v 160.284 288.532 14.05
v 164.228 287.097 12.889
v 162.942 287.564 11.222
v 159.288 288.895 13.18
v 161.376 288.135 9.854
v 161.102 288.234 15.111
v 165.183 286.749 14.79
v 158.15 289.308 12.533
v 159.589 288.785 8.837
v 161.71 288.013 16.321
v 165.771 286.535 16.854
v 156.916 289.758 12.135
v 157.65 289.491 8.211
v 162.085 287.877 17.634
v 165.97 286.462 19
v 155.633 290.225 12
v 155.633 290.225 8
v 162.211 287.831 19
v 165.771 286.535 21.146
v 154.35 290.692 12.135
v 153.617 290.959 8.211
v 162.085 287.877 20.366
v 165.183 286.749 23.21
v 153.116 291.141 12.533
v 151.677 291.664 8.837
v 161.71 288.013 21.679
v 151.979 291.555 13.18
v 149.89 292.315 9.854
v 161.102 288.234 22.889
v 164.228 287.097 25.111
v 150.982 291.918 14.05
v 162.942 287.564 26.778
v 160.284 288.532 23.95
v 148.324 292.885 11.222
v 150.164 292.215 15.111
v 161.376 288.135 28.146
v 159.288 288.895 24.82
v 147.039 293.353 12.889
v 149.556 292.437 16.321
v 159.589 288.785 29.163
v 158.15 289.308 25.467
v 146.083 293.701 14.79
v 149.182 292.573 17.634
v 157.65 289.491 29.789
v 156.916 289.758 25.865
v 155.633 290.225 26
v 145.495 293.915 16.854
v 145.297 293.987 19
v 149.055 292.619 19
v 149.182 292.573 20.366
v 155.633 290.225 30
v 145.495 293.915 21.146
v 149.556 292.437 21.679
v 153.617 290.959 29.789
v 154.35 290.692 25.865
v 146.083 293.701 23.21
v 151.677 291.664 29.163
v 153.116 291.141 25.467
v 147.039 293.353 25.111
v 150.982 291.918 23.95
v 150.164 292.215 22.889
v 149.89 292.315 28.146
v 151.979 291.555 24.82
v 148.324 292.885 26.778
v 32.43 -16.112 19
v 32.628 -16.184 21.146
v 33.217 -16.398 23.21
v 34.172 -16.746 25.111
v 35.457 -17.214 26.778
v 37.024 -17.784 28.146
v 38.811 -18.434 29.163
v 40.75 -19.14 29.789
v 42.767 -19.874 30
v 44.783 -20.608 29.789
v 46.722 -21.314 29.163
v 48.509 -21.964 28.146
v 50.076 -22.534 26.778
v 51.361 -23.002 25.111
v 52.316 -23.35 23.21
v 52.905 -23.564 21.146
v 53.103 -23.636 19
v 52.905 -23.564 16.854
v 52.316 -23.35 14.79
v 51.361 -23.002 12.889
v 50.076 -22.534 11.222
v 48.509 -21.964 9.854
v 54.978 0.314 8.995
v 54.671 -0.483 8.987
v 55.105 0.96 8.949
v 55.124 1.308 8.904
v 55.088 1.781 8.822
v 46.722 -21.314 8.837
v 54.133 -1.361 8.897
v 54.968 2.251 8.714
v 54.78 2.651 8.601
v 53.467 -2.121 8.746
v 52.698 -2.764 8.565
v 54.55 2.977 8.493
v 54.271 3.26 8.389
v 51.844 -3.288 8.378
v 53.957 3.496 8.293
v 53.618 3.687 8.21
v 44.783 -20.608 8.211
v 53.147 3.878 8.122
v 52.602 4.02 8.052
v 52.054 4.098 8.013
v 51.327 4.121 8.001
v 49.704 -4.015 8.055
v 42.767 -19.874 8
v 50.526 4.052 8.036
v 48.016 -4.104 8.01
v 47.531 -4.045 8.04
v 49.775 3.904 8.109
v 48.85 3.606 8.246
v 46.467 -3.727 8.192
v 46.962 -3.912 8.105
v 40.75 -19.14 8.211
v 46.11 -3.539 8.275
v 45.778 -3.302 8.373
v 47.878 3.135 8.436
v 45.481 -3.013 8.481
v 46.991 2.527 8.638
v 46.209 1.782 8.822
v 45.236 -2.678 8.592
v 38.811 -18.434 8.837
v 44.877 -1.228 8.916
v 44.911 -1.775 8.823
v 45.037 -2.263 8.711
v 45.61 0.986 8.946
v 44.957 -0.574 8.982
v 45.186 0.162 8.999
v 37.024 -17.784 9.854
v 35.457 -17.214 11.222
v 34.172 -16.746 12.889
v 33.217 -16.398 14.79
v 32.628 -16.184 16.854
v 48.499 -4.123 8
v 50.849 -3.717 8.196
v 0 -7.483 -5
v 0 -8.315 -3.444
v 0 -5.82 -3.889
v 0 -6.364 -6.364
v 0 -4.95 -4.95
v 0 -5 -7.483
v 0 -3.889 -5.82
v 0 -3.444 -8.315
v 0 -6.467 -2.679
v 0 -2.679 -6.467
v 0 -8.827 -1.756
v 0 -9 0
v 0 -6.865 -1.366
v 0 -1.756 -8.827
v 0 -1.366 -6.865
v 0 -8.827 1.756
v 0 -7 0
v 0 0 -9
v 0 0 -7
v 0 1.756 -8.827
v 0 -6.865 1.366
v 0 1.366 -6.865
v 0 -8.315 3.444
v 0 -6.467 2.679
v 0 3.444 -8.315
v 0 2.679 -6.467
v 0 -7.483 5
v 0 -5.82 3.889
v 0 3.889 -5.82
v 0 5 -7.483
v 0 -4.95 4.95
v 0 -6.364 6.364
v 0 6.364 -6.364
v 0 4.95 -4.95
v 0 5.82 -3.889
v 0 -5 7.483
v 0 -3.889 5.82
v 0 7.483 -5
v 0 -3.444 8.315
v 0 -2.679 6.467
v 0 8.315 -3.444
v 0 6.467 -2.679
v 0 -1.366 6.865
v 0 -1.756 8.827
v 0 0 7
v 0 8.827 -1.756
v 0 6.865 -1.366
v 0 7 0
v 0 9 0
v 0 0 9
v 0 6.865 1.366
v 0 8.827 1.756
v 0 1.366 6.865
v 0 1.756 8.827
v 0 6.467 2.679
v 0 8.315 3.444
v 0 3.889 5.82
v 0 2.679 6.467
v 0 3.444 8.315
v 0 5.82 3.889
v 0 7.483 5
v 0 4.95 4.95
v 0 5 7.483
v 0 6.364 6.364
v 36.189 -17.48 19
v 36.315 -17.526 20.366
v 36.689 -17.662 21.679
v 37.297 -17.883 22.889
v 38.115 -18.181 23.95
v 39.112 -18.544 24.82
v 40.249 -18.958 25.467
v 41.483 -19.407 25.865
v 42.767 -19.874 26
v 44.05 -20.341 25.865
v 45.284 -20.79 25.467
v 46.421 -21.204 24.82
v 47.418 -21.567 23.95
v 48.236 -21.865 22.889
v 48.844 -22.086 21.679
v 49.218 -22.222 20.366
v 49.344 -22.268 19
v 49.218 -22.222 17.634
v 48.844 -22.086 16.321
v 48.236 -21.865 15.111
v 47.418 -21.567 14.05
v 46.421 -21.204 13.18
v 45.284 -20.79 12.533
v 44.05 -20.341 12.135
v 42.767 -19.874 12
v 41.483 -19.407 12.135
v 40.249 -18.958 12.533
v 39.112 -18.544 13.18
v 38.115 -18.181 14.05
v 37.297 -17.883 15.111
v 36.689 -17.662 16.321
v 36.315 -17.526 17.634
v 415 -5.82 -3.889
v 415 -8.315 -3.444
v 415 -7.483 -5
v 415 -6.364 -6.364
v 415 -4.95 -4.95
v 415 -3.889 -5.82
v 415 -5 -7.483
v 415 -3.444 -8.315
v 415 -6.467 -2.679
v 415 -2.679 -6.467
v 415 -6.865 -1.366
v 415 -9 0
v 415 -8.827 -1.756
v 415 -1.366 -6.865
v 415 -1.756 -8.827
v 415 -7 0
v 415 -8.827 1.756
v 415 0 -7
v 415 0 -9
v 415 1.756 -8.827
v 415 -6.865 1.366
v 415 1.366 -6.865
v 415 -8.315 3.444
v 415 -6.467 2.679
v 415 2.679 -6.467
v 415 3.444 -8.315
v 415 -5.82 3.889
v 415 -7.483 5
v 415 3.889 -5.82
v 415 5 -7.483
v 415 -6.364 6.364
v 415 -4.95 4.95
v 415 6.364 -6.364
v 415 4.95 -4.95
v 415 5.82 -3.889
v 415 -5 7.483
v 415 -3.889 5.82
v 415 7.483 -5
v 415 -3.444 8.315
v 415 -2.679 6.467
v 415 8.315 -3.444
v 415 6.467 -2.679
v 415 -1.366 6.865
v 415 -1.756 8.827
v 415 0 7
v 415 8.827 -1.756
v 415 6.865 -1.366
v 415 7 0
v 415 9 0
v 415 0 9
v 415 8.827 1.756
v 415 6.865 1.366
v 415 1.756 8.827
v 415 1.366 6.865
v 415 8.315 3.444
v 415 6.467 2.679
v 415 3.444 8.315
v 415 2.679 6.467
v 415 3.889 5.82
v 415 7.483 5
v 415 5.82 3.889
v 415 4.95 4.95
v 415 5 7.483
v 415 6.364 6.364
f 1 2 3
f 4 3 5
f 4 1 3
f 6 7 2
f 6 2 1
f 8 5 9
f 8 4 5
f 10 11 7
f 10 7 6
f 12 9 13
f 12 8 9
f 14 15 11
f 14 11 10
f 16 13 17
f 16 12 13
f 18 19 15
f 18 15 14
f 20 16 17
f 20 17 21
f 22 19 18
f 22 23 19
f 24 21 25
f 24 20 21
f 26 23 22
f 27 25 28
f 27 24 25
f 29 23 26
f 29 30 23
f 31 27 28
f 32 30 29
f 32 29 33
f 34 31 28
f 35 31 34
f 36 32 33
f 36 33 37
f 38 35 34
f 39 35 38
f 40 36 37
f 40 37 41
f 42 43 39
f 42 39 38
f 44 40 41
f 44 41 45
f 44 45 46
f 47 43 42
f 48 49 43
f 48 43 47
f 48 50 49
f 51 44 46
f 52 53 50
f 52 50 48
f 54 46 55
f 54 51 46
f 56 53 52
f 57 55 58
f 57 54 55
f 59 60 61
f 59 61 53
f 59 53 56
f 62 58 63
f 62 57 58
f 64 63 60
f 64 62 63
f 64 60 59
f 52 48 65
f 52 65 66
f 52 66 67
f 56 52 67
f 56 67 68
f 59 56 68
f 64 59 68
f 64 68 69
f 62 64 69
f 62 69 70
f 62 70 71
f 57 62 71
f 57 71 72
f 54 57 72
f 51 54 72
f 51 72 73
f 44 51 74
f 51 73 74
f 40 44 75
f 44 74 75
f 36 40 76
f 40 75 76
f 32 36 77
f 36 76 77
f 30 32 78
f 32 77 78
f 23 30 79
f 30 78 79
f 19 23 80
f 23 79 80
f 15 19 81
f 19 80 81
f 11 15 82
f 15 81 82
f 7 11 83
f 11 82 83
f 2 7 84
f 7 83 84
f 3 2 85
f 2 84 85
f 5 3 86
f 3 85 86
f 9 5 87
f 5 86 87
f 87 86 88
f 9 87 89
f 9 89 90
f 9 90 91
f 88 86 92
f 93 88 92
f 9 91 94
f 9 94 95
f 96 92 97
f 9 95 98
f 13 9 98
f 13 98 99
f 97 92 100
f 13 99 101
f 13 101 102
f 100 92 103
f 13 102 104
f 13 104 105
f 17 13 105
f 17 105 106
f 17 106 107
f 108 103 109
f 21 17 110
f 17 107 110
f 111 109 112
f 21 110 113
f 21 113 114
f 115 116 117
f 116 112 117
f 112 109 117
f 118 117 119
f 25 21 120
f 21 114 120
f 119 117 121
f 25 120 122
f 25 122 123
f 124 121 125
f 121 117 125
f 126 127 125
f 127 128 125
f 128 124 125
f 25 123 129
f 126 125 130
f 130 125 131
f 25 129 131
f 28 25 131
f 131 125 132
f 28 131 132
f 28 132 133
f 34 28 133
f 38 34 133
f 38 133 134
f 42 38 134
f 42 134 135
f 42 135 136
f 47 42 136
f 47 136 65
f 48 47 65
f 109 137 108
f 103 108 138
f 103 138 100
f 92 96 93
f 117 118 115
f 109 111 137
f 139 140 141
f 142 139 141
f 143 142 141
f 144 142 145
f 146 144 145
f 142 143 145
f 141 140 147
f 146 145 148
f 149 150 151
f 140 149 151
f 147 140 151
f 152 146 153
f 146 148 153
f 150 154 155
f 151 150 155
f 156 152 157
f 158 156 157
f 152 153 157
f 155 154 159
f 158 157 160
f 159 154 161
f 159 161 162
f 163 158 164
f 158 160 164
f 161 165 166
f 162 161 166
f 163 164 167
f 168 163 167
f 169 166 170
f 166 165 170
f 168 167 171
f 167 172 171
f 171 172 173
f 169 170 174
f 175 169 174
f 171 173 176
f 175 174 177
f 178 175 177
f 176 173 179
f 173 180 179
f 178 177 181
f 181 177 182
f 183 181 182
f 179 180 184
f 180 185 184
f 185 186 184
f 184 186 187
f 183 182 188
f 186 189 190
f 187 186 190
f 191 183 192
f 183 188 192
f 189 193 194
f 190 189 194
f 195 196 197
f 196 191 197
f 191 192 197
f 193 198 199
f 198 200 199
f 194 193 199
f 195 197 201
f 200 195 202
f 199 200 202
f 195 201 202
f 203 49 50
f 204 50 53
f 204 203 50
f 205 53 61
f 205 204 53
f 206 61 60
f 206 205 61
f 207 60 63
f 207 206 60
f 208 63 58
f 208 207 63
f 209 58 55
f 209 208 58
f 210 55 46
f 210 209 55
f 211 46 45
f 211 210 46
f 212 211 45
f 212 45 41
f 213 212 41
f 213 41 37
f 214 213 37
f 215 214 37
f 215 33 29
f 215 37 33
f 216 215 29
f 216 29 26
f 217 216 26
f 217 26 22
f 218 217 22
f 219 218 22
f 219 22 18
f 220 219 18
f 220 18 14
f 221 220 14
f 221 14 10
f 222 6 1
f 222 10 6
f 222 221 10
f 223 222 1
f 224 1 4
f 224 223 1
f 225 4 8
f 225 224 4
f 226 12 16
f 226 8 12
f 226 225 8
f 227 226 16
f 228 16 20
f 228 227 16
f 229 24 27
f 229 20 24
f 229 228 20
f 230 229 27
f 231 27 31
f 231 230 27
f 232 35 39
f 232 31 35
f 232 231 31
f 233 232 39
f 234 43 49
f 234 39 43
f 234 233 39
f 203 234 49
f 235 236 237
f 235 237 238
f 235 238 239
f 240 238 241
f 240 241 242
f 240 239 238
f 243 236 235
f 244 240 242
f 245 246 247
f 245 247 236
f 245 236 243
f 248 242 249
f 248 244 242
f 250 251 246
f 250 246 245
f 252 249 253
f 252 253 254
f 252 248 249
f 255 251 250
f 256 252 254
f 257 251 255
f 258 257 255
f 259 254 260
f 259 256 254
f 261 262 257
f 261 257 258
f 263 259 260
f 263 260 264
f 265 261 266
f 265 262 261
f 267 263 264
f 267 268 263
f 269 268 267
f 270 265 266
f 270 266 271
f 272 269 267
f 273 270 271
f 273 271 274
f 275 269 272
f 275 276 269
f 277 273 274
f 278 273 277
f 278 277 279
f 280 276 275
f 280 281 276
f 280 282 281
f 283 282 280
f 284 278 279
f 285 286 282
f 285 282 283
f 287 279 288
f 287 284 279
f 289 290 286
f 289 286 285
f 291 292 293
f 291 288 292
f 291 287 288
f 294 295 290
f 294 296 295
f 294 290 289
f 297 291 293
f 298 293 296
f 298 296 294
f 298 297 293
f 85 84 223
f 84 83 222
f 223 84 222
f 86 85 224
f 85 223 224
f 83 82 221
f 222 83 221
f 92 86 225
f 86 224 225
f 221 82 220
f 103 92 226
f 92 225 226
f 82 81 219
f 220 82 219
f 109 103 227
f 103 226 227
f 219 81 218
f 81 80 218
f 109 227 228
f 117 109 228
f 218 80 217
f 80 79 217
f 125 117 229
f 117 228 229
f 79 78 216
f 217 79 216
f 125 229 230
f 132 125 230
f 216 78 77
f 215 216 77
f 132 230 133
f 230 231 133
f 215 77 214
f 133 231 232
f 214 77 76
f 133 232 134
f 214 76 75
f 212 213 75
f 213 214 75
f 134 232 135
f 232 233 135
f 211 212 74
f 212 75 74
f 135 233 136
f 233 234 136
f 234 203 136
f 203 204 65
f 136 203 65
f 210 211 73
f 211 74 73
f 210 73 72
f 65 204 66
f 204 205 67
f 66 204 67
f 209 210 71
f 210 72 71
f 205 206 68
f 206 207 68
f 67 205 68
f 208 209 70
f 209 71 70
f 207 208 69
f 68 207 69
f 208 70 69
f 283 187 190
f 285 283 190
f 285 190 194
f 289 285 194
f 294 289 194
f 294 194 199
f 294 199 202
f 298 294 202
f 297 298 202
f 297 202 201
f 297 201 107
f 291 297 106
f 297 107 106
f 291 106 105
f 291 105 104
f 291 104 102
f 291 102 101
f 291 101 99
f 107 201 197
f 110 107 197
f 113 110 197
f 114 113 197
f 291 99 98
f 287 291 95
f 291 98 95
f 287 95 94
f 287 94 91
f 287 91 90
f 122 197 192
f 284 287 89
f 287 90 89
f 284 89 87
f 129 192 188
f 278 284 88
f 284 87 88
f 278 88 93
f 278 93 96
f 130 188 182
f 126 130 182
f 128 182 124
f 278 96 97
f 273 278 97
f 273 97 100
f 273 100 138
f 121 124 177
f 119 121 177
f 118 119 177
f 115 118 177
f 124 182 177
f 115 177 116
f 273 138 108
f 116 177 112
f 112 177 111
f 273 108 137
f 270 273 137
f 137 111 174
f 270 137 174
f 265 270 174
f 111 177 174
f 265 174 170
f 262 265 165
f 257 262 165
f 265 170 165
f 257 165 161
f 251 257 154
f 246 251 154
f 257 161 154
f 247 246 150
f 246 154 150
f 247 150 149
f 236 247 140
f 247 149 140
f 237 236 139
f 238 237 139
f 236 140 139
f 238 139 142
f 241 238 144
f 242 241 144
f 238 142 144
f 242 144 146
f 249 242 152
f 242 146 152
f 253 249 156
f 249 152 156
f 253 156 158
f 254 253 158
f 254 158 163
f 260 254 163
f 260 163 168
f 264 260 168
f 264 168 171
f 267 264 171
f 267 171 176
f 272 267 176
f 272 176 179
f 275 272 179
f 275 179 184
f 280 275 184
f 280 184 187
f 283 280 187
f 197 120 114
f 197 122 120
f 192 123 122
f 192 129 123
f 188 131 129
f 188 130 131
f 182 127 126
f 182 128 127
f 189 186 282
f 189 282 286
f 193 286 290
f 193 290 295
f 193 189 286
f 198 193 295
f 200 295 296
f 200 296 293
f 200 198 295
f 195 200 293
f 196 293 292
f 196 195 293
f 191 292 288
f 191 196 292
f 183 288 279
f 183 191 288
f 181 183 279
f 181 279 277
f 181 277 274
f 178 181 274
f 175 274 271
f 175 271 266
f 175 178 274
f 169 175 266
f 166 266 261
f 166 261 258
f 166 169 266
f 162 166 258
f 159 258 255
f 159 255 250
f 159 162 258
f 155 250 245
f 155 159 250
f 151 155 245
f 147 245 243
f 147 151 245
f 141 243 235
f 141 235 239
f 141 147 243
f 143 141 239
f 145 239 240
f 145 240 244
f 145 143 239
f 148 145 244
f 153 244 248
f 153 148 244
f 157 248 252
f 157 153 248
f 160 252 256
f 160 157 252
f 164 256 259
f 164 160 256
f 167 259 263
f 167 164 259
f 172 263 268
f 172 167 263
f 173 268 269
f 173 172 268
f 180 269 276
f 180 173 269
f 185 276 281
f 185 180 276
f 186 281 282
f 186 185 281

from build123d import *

# Parameters (mm, degrees)
F0_R     = 9
F0_R_2   = 7
F1_DEPTH = 415
F5_R     = 11
F5_R_2   = 7
F6_DEPTH = 330
F7_R     = 7
F8_DEPTH = 422.245019476


with BuildPart() as f1:
    # F0 (on Right) → F1 (new body)
    with BuildSketch(Plane.YZ):
        Circle(F0_R)
        Circle(F0_R_2, mode=Mode.SUBTRACT)
    extrude(amount=F1_DEPTH)

    # F5 (on offset) → F6 (join)
    with BuildSketch(Plane(origin=(-1.3846092047, -3.8041825246, 0), x_dir=(-0.9396926208, 0.3420201433, 0), z_dir=(0.3420201433, 0.9396926208, 0))):
        with Locations((-46.9846310393, 19)):
            Circle(F5_R)
        with Locations((-46.9846310393, 19)):
            Circle(F5_R_2, mode=Mode.SUBTRACT)
    extrude(amount=F6_DEPTH)

    # F7 (on face) → F8 (cut, through all)
    with BuildSketch(Plane(origin=(-1.3846092047, -3.8041825246, 0), x_dir=(0.9396926208, -0.3420201433, 0), z_dir=(-0.3420201433, -0.9396926208, 0))):
        with Locations((46.9846310393, 19)):
            Circle(F7_R)
    extrude(amount=-F8_DEPTH, mode=Mode.SUBTRACT)


solid = f1.part
